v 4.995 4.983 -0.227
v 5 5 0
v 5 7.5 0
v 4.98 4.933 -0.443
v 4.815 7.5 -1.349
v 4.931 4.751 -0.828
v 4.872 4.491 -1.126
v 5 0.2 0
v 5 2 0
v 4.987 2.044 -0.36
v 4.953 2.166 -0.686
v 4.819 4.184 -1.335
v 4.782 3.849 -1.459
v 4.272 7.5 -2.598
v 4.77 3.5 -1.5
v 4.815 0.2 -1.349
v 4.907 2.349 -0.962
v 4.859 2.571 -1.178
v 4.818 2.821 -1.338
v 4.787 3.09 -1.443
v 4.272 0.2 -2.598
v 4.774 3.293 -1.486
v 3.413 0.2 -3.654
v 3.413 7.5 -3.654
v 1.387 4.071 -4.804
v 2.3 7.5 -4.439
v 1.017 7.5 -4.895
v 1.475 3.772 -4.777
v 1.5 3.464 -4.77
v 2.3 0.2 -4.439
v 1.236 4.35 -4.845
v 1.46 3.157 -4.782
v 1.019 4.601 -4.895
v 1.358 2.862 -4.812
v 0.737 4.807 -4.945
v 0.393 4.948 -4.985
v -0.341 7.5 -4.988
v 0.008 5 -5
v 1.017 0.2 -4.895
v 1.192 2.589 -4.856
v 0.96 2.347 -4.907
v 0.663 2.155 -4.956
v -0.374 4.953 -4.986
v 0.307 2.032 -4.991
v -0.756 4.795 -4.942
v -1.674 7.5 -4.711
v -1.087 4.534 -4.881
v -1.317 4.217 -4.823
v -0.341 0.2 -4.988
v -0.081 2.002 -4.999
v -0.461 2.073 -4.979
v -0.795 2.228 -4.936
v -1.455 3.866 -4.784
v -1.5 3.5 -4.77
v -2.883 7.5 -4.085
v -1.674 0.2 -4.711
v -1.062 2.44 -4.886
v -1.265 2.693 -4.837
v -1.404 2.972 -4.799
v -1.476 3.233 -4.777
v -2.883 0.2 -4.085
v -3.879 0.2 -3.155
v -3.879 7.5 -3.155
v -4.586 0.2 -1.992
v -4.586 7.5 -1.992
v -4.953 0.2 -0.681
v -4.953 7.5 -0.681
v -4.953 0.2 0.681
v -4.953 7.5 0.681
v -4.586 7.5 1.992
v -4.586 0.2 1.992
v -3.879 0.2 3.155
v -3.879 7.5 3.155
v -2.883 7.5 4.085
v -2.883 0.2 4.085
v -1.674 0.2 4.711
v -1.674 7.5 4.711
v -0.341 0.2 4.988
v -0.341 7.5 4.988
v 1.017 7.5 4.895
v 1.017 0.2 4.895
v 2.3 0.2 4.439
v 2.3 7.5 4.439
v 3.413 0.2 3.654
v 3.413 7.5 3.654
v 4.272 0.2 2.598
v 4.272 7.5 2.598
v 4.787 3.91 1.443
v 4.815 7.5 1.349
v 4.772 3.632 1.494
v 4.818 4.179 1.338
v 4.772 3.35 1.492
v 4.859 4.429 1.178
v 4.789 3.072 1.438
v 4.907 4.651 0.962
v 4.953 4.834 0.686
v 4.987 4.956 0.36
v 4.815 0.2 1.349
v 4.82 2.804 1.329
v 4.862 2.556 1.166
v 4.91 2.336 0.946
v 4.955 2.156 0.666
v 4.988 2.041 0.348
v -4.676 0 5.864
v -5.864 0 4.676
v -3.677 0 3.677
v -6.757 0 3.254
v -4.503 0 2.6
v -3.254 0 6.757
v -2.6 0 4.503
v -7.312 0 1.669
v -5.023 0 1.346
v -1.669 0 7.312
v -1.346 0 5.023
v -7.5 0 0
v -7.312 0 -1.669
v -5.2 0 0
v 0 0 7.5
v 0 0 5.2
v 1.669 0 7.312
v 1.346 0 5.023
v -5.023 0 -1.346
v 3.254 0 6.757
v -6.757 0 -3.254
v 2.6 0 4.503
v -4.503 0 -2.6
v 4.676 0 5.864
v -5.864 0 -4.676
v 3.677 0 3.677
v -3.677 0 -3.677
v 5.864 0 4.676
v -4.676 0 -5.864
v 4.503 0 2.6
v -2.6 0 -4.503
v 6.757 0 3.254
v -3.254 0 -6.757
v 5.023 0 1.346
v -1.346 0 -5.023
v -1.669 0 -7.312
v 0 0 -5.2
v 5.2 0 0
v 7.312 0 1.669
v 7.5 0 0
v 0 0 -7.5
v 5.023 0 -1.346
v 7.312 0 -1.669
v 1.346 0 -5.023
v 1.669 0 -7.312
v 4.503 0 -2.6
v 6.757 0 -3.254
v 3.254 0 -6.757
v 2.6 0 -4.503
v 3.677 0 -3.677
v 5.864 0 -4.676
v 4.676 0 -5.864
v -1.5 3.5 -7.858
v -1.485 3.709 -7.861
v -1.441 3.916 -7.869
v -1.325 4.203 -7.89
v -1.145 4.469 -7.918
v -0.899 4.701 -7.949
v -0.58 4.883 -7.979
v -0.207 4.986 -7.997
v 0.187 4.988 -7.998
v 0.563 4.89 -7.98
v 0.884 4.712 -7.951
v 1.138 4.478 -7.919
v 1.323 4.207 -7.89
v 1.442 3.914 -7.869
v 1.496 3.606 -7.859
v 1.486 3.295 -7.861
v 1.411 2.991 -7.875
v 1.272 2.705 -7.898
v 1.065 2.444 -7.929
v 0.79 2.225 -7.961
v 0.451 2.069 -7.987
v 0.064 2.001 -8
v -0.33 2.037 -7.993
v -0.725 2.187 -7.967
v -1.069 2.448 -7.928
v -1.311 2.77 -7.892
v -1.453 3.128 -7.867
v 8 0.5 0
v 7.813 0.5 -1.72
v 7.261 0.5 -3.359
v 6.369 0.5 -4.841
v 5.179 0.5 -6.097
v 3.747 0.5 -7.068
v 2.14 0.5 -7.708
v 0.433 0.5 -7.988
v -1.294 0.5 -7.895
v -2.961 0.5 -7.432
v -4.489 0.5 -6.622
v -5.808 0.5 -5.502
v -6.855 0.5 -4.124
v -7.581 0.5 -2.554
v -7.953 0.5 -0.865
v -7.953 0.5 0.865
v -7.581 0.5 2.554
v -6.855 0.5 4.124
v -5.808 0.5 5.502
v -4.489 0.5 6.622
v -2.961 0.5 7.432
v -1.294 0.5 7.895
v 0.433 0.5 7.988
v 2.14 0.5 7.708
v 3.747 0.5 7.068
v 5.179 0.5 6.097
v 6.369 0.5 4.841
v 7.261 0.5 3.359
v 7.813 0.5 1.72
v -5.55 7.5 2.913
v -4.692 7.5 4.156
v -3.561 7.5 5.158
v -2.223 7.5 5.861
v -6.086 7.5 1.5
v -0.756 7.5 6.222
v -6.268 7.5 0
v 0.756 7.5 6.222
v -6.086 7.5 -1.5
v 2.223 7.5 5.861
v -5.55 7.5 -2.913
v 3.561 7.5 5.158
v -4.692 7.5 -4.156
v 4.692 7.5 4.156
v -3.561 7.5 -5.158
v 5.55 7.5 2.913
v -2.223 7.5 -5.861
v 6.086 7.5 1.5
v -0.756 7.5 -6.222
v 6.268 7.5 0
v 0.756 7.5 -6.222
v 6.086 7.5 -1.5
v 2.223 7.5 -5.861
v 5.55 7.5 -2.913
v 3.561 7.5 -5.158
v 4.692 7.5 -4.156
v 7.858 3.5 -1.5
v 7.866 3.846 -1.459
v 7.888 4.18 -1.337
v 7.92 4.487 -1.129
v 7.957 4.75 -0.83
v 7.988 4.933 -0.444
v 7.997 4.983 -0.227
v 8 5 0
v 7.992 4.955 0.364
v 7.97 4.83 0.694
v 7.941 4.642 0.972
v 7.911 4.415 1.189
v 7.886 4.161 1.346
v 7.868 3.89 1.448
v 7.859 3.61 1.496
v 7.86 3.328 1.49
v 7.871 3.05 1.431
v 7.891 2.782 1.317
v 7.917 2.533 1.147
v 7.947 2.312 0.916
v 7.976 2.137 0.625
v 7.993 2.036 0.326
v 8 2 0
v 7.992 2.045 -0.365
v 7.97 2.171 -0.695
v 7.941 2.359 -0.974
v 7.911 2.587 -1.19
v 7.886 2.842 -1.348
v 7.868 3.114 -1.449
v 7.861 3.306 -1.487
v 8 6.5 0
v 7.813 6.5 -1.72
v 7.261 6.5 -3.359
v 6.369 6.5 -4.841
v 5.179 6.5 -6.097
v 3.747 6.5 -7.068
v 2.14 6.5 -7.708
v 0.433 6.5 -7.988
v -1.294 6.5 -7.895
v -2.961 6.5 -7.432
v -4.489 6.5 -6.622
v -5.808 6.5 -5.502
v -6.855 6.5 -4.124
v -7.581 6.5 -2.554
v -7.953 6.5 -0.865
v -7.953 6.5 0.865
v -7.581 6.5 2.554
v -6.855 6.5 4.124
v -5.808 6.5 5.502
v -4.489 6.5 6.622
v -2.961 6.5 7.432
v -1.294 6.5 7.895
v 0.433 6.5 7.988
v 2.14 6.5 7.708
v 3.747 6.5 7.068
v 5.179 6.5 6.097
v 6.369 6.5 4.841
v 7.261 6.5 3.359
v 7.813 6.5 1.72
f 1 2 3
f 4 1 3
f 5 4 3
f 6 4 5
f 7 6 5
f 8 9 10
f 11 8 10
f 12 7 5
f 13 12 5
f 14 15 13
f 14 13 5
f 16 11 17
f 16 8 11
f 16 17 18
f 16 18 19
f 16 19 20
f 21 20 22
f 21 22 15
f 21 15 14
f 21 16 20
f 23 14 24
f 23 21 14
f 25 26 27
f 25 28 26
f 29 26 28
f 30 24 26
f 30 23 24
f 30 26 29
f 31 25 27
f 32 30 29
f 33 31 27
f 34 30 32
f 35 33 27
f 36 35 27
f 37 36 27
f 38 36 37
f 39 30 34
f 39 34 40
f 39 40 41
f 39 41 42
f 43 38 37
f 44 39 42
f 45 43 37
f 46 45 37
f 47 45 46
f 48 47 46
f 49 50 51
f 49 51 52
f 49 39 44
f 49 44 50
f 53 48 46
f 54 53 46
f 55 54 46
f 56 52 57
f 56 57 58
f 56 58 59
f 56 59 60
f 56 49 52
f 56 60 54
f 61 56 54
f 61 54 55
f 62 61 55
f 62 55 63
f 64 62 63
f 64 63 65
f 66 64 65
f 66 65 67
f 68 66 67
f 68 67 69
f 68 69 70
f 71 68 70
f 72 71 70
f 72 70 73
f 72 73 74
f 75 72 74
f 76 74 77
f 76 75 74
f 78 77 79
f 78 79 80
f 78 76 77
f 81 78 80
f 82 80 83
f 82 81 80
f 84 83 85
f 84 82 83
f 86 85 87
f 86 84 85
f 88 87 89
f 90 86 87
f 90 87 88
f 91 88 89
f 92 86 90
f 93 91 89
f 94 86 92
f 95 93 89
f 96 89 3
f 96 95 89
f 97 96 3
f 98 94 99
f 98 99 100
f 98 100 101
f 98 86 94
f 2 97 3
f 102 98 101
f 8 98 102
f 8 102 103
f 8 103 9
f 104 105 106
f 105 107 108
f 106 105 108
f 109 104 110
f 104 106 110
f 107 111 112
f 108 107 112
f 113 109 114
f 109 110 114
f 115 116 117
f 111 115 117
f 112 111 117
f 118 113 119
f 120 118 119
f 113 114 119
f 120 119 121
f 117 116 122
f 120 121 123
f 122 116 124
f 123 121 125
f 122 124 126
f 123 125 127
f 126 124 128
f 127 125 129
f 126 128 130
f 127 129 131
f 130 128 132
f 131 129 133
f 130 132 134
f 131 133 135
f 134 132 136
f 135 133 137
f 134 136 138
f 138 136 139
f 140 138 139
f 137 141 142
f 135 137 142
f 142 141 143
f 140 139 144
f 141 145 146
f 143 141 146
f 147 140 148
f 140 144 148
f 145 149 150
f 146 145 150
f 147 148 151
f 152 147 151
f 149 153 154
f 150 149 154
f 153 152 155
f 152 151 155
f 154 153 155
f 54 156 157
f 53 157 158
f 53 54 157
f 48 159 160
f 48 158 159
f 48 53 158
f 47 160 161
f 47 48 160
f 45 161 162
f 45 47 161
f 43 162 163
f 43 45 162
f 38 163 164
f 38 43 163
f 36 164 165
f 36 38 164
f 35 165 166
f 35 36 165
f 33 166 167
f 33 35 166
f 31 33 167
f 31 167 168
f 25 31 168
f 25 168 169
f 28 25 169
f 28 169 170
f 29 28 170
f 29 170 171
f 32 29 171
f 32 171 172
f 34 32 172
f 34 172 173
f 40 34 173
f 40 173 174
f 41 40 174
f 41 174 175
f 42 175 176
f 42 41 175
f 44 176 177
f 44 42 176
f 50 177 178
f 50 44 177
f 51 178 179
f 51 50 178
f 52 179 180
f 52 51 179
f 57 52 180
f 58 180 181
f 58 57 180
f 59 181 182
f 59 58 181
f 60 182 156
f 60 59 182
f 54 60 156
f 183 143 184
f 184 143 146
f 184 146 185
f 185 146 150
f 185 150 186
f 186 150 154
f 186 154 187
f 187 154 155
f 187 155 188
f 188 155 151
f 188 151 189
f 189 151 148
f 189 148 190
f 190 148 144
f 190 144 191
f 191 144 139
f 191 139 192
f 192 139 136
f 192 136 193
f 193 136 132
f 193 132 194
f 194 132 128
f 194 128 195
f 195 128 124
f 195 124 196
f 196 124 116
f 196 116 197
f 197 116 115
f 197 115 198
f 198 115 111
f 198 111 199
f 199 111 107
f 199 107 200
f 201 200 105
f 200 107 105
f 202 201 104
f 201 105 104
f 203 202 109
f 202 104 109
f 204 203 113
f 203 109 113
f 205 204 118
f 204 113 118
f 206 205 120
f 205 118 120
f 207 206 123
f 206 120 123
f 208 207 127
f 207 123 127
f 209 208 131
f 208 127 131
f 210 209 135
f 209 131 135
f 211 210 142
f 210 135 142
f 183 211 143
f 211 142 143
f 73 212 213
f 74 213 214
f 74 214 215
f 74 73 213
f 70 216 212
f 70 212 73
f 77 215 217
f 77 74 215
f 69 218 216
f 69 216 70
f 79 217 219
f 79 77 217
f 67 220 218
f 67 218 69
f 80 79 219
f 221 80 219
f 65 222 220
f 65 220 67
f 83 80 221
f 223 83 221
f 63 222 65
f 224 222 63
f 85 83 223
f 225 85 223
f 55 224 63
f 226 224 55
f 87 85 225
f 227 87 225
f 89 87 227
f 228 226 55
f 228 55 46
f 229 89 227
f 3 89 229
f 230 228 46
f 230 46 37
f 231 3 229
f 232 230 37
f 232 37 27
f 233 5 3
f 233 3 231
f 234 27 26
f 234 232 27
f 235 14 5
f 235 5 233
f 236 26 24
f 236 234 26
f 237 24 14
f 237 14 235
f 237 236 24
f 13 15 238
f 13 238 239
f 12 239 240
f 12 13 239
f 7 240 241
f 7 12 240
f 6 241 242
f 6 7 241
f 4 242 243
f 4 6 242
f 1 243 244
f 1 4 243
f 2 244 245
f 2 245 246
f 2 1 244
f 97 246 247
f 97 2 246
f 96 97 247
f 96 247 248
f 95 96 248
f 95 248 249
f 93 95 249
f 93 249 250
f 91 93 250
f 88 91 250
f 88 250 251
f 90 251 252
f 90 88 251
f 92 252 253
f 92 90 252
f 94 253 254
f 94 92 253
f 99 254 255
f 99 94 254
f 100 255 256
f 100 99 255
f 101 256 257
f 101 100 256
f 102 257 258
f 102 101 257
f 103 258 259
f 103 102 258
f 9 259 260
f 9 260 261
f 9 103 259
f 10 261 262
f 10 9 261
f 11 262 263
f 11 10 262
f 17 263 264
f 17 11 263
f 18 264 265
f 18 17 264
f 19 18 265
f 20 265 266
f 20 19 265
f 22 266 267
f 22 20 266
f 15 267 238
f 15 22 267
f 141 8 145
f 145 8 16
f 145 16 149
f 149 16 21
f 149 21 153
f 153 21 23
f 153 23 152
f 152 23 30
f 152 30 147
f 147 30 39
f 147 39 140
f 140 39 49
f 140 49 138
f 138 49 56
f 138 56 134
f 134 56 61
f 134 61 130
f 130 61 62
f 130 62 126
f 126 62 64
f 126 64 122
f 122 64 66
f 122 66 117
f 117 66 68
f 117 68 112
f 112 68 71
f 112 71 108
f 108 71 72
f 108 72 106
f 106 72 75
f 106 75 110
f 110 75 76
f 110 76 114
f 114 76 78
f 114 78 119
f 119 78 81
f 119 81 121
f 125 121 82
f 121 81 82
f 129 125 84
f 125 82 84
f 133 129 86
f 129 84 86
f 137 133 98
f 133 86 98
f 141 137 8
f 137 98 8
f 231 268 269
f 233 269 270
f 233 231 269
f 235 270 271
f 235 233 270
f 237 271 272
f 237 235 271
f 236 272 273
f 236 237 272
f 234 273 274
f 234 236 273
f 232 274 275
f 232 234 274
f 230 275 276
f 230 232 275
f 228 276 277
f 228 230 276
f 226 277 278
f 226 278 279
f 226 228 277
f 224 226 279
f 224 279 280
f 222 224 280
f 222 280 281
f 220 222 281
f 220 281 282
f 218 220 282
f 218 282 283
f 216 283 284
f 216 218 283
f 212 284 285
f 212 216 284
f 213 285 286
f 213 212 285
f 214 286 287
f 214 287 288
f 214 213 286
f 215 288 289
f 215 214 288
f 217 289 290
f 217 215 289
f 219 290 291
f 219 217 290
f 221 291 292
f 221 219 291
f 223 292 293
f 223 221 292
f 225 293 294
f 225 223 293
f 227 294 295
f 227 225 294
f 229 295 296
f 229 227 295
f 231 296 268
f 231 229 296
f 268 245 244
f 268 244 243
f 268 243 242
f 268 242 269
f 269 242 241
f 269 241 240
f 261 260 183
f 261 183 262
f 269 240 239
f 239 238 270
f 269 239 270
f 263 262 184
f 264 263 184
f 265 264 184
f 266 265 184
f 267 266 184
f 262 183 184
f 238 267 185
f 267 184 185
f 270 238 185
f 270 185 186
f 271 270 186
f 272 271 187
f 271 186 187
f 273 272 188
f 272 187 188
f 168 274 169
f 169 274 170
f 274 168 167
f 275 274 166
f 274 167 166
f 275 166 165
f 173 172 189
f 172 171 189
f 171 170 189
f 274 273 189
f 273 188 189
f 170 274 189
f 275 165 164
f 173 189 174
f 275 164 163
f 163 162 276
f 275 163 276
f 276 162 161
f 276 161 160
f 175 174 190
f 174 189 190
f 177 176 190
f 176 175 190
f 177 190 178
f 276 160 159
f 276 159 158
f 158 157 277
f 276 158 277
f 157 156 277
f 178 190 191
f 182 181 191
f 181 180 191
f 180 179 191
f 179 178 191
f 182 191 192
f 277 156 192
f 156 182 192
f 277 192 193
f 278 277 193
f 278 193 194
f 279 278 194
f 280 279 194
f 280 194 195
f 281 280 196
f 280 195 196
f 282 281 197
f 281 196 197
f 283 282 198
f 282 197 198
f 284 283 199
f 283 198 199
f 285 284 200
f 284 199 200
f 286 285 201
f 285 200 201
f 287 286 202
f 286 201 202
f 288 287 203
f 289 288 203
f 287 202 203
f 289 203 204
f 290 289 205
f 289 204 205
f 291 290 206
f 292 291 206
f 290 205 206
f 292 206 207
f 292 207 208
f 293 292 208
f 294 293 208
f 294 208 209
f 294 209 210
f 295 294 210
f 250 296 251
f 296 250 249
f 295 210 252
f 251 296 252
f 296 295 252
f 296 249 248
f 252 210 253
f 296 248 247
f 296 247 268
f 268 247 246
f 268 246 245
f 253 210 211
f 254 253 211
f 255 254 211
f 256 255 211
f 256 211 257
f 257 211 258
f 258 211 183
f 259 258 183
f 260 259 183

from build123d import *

# Parameters (mm, degrees)
SKETCH1_R           = 8
SKETCH1_R_2         = 5
BOSS_EXTRUDE1_DEPTH = 7.5
CHAMFER1_SIZE       = 1
CHAMFER1_SIZE2      = 1.732050808
CHAMFER2_SIZE       = 0.5
CHAMFER3_SIZE       = 0.2
CUT_EXTRUDE1_START  = -3.230304
SKETCH2_R           = 1.5
CUT_EXTRUDE1_DEPTH  = 3.230304
CIRPATTERN1_COUNT   = 2
CIRPATTERN1_ANGLE   = 90


with BuildPart() as part:
    # Sketch1 → Boss-Extrude1 (new body)
    with BuildSketch(Plane(origin=(0, 0, 0), x_dir=(1, 0, 0), z_dir=(0, 1, 0))):
        Circle(SKETCH1_R)
        Circle(SKETCH1_R_2, mode=Mode.SUBTRACT)
    extrude(amount=BOSS_EXTRUDE1_DEPTH)

    # Chamfer1
    chamfer1_edges = [part.edges().sort_by_distance(p)[0] for p in [
        (-8, 7.5, 0),
    ]]
    chamfer1_side = [part.faces().sort_by_distance(p)[0] for p in [
        (-8, 3.75, 0),
    ]]
    chamfer(chamfer1_edges, length=CHAMFER1_SIZE, length2=CHAMFER1_SIZE2, reference=chamfer1_side[0])

    # Chamfer2
    chamfer2_edges = [part.edges().sort_by_distance(p)[0] for p in [
        (-8, 0, 0),
    ]]
    chamfer(chamfer2_edges, length=CHAMFER2_SIZE)

    # Chamfer3
    chamfer3_edges = [part.edges().sort_by_distance(p)[0] for p in [
        (-5, 0, 0),
    ]]
    chamfer(chamfer3_edges, length=CHAMFER3_SIZE)

    # Sketch2 → Cut-Extrude1 (cut)
    with BuildSketch(Plane(origin=(8, 0, 0), x_dir=(0, 0, -1), z_dir=(1, 0, 0)).offset(CUT_EXTRUDE1_START)):
        with Locations((0, 3.5)):
            Circle(SKETCH2_R)
    cut_extrude1 = extrude(amount=CUT_EXTRUDE1_DEPTH, mode=Mode.SUBTRACT)

    # CirPattern1: Cut-Extrude1 ×2 about axis
    cirpattern1_axis = Axis((0, 7.5, 0), (0, 1, 0))
    for i in range(1, CIRPATTERN1_COUNT):
        add(cut_extrude1.rotate(cirpattern1_axis, i * CIRPATTERN1_ANGLE / (CIRPATTERN1_COUNT - 1)), mode=Mode.SUBTRACT)


solid = part.part
